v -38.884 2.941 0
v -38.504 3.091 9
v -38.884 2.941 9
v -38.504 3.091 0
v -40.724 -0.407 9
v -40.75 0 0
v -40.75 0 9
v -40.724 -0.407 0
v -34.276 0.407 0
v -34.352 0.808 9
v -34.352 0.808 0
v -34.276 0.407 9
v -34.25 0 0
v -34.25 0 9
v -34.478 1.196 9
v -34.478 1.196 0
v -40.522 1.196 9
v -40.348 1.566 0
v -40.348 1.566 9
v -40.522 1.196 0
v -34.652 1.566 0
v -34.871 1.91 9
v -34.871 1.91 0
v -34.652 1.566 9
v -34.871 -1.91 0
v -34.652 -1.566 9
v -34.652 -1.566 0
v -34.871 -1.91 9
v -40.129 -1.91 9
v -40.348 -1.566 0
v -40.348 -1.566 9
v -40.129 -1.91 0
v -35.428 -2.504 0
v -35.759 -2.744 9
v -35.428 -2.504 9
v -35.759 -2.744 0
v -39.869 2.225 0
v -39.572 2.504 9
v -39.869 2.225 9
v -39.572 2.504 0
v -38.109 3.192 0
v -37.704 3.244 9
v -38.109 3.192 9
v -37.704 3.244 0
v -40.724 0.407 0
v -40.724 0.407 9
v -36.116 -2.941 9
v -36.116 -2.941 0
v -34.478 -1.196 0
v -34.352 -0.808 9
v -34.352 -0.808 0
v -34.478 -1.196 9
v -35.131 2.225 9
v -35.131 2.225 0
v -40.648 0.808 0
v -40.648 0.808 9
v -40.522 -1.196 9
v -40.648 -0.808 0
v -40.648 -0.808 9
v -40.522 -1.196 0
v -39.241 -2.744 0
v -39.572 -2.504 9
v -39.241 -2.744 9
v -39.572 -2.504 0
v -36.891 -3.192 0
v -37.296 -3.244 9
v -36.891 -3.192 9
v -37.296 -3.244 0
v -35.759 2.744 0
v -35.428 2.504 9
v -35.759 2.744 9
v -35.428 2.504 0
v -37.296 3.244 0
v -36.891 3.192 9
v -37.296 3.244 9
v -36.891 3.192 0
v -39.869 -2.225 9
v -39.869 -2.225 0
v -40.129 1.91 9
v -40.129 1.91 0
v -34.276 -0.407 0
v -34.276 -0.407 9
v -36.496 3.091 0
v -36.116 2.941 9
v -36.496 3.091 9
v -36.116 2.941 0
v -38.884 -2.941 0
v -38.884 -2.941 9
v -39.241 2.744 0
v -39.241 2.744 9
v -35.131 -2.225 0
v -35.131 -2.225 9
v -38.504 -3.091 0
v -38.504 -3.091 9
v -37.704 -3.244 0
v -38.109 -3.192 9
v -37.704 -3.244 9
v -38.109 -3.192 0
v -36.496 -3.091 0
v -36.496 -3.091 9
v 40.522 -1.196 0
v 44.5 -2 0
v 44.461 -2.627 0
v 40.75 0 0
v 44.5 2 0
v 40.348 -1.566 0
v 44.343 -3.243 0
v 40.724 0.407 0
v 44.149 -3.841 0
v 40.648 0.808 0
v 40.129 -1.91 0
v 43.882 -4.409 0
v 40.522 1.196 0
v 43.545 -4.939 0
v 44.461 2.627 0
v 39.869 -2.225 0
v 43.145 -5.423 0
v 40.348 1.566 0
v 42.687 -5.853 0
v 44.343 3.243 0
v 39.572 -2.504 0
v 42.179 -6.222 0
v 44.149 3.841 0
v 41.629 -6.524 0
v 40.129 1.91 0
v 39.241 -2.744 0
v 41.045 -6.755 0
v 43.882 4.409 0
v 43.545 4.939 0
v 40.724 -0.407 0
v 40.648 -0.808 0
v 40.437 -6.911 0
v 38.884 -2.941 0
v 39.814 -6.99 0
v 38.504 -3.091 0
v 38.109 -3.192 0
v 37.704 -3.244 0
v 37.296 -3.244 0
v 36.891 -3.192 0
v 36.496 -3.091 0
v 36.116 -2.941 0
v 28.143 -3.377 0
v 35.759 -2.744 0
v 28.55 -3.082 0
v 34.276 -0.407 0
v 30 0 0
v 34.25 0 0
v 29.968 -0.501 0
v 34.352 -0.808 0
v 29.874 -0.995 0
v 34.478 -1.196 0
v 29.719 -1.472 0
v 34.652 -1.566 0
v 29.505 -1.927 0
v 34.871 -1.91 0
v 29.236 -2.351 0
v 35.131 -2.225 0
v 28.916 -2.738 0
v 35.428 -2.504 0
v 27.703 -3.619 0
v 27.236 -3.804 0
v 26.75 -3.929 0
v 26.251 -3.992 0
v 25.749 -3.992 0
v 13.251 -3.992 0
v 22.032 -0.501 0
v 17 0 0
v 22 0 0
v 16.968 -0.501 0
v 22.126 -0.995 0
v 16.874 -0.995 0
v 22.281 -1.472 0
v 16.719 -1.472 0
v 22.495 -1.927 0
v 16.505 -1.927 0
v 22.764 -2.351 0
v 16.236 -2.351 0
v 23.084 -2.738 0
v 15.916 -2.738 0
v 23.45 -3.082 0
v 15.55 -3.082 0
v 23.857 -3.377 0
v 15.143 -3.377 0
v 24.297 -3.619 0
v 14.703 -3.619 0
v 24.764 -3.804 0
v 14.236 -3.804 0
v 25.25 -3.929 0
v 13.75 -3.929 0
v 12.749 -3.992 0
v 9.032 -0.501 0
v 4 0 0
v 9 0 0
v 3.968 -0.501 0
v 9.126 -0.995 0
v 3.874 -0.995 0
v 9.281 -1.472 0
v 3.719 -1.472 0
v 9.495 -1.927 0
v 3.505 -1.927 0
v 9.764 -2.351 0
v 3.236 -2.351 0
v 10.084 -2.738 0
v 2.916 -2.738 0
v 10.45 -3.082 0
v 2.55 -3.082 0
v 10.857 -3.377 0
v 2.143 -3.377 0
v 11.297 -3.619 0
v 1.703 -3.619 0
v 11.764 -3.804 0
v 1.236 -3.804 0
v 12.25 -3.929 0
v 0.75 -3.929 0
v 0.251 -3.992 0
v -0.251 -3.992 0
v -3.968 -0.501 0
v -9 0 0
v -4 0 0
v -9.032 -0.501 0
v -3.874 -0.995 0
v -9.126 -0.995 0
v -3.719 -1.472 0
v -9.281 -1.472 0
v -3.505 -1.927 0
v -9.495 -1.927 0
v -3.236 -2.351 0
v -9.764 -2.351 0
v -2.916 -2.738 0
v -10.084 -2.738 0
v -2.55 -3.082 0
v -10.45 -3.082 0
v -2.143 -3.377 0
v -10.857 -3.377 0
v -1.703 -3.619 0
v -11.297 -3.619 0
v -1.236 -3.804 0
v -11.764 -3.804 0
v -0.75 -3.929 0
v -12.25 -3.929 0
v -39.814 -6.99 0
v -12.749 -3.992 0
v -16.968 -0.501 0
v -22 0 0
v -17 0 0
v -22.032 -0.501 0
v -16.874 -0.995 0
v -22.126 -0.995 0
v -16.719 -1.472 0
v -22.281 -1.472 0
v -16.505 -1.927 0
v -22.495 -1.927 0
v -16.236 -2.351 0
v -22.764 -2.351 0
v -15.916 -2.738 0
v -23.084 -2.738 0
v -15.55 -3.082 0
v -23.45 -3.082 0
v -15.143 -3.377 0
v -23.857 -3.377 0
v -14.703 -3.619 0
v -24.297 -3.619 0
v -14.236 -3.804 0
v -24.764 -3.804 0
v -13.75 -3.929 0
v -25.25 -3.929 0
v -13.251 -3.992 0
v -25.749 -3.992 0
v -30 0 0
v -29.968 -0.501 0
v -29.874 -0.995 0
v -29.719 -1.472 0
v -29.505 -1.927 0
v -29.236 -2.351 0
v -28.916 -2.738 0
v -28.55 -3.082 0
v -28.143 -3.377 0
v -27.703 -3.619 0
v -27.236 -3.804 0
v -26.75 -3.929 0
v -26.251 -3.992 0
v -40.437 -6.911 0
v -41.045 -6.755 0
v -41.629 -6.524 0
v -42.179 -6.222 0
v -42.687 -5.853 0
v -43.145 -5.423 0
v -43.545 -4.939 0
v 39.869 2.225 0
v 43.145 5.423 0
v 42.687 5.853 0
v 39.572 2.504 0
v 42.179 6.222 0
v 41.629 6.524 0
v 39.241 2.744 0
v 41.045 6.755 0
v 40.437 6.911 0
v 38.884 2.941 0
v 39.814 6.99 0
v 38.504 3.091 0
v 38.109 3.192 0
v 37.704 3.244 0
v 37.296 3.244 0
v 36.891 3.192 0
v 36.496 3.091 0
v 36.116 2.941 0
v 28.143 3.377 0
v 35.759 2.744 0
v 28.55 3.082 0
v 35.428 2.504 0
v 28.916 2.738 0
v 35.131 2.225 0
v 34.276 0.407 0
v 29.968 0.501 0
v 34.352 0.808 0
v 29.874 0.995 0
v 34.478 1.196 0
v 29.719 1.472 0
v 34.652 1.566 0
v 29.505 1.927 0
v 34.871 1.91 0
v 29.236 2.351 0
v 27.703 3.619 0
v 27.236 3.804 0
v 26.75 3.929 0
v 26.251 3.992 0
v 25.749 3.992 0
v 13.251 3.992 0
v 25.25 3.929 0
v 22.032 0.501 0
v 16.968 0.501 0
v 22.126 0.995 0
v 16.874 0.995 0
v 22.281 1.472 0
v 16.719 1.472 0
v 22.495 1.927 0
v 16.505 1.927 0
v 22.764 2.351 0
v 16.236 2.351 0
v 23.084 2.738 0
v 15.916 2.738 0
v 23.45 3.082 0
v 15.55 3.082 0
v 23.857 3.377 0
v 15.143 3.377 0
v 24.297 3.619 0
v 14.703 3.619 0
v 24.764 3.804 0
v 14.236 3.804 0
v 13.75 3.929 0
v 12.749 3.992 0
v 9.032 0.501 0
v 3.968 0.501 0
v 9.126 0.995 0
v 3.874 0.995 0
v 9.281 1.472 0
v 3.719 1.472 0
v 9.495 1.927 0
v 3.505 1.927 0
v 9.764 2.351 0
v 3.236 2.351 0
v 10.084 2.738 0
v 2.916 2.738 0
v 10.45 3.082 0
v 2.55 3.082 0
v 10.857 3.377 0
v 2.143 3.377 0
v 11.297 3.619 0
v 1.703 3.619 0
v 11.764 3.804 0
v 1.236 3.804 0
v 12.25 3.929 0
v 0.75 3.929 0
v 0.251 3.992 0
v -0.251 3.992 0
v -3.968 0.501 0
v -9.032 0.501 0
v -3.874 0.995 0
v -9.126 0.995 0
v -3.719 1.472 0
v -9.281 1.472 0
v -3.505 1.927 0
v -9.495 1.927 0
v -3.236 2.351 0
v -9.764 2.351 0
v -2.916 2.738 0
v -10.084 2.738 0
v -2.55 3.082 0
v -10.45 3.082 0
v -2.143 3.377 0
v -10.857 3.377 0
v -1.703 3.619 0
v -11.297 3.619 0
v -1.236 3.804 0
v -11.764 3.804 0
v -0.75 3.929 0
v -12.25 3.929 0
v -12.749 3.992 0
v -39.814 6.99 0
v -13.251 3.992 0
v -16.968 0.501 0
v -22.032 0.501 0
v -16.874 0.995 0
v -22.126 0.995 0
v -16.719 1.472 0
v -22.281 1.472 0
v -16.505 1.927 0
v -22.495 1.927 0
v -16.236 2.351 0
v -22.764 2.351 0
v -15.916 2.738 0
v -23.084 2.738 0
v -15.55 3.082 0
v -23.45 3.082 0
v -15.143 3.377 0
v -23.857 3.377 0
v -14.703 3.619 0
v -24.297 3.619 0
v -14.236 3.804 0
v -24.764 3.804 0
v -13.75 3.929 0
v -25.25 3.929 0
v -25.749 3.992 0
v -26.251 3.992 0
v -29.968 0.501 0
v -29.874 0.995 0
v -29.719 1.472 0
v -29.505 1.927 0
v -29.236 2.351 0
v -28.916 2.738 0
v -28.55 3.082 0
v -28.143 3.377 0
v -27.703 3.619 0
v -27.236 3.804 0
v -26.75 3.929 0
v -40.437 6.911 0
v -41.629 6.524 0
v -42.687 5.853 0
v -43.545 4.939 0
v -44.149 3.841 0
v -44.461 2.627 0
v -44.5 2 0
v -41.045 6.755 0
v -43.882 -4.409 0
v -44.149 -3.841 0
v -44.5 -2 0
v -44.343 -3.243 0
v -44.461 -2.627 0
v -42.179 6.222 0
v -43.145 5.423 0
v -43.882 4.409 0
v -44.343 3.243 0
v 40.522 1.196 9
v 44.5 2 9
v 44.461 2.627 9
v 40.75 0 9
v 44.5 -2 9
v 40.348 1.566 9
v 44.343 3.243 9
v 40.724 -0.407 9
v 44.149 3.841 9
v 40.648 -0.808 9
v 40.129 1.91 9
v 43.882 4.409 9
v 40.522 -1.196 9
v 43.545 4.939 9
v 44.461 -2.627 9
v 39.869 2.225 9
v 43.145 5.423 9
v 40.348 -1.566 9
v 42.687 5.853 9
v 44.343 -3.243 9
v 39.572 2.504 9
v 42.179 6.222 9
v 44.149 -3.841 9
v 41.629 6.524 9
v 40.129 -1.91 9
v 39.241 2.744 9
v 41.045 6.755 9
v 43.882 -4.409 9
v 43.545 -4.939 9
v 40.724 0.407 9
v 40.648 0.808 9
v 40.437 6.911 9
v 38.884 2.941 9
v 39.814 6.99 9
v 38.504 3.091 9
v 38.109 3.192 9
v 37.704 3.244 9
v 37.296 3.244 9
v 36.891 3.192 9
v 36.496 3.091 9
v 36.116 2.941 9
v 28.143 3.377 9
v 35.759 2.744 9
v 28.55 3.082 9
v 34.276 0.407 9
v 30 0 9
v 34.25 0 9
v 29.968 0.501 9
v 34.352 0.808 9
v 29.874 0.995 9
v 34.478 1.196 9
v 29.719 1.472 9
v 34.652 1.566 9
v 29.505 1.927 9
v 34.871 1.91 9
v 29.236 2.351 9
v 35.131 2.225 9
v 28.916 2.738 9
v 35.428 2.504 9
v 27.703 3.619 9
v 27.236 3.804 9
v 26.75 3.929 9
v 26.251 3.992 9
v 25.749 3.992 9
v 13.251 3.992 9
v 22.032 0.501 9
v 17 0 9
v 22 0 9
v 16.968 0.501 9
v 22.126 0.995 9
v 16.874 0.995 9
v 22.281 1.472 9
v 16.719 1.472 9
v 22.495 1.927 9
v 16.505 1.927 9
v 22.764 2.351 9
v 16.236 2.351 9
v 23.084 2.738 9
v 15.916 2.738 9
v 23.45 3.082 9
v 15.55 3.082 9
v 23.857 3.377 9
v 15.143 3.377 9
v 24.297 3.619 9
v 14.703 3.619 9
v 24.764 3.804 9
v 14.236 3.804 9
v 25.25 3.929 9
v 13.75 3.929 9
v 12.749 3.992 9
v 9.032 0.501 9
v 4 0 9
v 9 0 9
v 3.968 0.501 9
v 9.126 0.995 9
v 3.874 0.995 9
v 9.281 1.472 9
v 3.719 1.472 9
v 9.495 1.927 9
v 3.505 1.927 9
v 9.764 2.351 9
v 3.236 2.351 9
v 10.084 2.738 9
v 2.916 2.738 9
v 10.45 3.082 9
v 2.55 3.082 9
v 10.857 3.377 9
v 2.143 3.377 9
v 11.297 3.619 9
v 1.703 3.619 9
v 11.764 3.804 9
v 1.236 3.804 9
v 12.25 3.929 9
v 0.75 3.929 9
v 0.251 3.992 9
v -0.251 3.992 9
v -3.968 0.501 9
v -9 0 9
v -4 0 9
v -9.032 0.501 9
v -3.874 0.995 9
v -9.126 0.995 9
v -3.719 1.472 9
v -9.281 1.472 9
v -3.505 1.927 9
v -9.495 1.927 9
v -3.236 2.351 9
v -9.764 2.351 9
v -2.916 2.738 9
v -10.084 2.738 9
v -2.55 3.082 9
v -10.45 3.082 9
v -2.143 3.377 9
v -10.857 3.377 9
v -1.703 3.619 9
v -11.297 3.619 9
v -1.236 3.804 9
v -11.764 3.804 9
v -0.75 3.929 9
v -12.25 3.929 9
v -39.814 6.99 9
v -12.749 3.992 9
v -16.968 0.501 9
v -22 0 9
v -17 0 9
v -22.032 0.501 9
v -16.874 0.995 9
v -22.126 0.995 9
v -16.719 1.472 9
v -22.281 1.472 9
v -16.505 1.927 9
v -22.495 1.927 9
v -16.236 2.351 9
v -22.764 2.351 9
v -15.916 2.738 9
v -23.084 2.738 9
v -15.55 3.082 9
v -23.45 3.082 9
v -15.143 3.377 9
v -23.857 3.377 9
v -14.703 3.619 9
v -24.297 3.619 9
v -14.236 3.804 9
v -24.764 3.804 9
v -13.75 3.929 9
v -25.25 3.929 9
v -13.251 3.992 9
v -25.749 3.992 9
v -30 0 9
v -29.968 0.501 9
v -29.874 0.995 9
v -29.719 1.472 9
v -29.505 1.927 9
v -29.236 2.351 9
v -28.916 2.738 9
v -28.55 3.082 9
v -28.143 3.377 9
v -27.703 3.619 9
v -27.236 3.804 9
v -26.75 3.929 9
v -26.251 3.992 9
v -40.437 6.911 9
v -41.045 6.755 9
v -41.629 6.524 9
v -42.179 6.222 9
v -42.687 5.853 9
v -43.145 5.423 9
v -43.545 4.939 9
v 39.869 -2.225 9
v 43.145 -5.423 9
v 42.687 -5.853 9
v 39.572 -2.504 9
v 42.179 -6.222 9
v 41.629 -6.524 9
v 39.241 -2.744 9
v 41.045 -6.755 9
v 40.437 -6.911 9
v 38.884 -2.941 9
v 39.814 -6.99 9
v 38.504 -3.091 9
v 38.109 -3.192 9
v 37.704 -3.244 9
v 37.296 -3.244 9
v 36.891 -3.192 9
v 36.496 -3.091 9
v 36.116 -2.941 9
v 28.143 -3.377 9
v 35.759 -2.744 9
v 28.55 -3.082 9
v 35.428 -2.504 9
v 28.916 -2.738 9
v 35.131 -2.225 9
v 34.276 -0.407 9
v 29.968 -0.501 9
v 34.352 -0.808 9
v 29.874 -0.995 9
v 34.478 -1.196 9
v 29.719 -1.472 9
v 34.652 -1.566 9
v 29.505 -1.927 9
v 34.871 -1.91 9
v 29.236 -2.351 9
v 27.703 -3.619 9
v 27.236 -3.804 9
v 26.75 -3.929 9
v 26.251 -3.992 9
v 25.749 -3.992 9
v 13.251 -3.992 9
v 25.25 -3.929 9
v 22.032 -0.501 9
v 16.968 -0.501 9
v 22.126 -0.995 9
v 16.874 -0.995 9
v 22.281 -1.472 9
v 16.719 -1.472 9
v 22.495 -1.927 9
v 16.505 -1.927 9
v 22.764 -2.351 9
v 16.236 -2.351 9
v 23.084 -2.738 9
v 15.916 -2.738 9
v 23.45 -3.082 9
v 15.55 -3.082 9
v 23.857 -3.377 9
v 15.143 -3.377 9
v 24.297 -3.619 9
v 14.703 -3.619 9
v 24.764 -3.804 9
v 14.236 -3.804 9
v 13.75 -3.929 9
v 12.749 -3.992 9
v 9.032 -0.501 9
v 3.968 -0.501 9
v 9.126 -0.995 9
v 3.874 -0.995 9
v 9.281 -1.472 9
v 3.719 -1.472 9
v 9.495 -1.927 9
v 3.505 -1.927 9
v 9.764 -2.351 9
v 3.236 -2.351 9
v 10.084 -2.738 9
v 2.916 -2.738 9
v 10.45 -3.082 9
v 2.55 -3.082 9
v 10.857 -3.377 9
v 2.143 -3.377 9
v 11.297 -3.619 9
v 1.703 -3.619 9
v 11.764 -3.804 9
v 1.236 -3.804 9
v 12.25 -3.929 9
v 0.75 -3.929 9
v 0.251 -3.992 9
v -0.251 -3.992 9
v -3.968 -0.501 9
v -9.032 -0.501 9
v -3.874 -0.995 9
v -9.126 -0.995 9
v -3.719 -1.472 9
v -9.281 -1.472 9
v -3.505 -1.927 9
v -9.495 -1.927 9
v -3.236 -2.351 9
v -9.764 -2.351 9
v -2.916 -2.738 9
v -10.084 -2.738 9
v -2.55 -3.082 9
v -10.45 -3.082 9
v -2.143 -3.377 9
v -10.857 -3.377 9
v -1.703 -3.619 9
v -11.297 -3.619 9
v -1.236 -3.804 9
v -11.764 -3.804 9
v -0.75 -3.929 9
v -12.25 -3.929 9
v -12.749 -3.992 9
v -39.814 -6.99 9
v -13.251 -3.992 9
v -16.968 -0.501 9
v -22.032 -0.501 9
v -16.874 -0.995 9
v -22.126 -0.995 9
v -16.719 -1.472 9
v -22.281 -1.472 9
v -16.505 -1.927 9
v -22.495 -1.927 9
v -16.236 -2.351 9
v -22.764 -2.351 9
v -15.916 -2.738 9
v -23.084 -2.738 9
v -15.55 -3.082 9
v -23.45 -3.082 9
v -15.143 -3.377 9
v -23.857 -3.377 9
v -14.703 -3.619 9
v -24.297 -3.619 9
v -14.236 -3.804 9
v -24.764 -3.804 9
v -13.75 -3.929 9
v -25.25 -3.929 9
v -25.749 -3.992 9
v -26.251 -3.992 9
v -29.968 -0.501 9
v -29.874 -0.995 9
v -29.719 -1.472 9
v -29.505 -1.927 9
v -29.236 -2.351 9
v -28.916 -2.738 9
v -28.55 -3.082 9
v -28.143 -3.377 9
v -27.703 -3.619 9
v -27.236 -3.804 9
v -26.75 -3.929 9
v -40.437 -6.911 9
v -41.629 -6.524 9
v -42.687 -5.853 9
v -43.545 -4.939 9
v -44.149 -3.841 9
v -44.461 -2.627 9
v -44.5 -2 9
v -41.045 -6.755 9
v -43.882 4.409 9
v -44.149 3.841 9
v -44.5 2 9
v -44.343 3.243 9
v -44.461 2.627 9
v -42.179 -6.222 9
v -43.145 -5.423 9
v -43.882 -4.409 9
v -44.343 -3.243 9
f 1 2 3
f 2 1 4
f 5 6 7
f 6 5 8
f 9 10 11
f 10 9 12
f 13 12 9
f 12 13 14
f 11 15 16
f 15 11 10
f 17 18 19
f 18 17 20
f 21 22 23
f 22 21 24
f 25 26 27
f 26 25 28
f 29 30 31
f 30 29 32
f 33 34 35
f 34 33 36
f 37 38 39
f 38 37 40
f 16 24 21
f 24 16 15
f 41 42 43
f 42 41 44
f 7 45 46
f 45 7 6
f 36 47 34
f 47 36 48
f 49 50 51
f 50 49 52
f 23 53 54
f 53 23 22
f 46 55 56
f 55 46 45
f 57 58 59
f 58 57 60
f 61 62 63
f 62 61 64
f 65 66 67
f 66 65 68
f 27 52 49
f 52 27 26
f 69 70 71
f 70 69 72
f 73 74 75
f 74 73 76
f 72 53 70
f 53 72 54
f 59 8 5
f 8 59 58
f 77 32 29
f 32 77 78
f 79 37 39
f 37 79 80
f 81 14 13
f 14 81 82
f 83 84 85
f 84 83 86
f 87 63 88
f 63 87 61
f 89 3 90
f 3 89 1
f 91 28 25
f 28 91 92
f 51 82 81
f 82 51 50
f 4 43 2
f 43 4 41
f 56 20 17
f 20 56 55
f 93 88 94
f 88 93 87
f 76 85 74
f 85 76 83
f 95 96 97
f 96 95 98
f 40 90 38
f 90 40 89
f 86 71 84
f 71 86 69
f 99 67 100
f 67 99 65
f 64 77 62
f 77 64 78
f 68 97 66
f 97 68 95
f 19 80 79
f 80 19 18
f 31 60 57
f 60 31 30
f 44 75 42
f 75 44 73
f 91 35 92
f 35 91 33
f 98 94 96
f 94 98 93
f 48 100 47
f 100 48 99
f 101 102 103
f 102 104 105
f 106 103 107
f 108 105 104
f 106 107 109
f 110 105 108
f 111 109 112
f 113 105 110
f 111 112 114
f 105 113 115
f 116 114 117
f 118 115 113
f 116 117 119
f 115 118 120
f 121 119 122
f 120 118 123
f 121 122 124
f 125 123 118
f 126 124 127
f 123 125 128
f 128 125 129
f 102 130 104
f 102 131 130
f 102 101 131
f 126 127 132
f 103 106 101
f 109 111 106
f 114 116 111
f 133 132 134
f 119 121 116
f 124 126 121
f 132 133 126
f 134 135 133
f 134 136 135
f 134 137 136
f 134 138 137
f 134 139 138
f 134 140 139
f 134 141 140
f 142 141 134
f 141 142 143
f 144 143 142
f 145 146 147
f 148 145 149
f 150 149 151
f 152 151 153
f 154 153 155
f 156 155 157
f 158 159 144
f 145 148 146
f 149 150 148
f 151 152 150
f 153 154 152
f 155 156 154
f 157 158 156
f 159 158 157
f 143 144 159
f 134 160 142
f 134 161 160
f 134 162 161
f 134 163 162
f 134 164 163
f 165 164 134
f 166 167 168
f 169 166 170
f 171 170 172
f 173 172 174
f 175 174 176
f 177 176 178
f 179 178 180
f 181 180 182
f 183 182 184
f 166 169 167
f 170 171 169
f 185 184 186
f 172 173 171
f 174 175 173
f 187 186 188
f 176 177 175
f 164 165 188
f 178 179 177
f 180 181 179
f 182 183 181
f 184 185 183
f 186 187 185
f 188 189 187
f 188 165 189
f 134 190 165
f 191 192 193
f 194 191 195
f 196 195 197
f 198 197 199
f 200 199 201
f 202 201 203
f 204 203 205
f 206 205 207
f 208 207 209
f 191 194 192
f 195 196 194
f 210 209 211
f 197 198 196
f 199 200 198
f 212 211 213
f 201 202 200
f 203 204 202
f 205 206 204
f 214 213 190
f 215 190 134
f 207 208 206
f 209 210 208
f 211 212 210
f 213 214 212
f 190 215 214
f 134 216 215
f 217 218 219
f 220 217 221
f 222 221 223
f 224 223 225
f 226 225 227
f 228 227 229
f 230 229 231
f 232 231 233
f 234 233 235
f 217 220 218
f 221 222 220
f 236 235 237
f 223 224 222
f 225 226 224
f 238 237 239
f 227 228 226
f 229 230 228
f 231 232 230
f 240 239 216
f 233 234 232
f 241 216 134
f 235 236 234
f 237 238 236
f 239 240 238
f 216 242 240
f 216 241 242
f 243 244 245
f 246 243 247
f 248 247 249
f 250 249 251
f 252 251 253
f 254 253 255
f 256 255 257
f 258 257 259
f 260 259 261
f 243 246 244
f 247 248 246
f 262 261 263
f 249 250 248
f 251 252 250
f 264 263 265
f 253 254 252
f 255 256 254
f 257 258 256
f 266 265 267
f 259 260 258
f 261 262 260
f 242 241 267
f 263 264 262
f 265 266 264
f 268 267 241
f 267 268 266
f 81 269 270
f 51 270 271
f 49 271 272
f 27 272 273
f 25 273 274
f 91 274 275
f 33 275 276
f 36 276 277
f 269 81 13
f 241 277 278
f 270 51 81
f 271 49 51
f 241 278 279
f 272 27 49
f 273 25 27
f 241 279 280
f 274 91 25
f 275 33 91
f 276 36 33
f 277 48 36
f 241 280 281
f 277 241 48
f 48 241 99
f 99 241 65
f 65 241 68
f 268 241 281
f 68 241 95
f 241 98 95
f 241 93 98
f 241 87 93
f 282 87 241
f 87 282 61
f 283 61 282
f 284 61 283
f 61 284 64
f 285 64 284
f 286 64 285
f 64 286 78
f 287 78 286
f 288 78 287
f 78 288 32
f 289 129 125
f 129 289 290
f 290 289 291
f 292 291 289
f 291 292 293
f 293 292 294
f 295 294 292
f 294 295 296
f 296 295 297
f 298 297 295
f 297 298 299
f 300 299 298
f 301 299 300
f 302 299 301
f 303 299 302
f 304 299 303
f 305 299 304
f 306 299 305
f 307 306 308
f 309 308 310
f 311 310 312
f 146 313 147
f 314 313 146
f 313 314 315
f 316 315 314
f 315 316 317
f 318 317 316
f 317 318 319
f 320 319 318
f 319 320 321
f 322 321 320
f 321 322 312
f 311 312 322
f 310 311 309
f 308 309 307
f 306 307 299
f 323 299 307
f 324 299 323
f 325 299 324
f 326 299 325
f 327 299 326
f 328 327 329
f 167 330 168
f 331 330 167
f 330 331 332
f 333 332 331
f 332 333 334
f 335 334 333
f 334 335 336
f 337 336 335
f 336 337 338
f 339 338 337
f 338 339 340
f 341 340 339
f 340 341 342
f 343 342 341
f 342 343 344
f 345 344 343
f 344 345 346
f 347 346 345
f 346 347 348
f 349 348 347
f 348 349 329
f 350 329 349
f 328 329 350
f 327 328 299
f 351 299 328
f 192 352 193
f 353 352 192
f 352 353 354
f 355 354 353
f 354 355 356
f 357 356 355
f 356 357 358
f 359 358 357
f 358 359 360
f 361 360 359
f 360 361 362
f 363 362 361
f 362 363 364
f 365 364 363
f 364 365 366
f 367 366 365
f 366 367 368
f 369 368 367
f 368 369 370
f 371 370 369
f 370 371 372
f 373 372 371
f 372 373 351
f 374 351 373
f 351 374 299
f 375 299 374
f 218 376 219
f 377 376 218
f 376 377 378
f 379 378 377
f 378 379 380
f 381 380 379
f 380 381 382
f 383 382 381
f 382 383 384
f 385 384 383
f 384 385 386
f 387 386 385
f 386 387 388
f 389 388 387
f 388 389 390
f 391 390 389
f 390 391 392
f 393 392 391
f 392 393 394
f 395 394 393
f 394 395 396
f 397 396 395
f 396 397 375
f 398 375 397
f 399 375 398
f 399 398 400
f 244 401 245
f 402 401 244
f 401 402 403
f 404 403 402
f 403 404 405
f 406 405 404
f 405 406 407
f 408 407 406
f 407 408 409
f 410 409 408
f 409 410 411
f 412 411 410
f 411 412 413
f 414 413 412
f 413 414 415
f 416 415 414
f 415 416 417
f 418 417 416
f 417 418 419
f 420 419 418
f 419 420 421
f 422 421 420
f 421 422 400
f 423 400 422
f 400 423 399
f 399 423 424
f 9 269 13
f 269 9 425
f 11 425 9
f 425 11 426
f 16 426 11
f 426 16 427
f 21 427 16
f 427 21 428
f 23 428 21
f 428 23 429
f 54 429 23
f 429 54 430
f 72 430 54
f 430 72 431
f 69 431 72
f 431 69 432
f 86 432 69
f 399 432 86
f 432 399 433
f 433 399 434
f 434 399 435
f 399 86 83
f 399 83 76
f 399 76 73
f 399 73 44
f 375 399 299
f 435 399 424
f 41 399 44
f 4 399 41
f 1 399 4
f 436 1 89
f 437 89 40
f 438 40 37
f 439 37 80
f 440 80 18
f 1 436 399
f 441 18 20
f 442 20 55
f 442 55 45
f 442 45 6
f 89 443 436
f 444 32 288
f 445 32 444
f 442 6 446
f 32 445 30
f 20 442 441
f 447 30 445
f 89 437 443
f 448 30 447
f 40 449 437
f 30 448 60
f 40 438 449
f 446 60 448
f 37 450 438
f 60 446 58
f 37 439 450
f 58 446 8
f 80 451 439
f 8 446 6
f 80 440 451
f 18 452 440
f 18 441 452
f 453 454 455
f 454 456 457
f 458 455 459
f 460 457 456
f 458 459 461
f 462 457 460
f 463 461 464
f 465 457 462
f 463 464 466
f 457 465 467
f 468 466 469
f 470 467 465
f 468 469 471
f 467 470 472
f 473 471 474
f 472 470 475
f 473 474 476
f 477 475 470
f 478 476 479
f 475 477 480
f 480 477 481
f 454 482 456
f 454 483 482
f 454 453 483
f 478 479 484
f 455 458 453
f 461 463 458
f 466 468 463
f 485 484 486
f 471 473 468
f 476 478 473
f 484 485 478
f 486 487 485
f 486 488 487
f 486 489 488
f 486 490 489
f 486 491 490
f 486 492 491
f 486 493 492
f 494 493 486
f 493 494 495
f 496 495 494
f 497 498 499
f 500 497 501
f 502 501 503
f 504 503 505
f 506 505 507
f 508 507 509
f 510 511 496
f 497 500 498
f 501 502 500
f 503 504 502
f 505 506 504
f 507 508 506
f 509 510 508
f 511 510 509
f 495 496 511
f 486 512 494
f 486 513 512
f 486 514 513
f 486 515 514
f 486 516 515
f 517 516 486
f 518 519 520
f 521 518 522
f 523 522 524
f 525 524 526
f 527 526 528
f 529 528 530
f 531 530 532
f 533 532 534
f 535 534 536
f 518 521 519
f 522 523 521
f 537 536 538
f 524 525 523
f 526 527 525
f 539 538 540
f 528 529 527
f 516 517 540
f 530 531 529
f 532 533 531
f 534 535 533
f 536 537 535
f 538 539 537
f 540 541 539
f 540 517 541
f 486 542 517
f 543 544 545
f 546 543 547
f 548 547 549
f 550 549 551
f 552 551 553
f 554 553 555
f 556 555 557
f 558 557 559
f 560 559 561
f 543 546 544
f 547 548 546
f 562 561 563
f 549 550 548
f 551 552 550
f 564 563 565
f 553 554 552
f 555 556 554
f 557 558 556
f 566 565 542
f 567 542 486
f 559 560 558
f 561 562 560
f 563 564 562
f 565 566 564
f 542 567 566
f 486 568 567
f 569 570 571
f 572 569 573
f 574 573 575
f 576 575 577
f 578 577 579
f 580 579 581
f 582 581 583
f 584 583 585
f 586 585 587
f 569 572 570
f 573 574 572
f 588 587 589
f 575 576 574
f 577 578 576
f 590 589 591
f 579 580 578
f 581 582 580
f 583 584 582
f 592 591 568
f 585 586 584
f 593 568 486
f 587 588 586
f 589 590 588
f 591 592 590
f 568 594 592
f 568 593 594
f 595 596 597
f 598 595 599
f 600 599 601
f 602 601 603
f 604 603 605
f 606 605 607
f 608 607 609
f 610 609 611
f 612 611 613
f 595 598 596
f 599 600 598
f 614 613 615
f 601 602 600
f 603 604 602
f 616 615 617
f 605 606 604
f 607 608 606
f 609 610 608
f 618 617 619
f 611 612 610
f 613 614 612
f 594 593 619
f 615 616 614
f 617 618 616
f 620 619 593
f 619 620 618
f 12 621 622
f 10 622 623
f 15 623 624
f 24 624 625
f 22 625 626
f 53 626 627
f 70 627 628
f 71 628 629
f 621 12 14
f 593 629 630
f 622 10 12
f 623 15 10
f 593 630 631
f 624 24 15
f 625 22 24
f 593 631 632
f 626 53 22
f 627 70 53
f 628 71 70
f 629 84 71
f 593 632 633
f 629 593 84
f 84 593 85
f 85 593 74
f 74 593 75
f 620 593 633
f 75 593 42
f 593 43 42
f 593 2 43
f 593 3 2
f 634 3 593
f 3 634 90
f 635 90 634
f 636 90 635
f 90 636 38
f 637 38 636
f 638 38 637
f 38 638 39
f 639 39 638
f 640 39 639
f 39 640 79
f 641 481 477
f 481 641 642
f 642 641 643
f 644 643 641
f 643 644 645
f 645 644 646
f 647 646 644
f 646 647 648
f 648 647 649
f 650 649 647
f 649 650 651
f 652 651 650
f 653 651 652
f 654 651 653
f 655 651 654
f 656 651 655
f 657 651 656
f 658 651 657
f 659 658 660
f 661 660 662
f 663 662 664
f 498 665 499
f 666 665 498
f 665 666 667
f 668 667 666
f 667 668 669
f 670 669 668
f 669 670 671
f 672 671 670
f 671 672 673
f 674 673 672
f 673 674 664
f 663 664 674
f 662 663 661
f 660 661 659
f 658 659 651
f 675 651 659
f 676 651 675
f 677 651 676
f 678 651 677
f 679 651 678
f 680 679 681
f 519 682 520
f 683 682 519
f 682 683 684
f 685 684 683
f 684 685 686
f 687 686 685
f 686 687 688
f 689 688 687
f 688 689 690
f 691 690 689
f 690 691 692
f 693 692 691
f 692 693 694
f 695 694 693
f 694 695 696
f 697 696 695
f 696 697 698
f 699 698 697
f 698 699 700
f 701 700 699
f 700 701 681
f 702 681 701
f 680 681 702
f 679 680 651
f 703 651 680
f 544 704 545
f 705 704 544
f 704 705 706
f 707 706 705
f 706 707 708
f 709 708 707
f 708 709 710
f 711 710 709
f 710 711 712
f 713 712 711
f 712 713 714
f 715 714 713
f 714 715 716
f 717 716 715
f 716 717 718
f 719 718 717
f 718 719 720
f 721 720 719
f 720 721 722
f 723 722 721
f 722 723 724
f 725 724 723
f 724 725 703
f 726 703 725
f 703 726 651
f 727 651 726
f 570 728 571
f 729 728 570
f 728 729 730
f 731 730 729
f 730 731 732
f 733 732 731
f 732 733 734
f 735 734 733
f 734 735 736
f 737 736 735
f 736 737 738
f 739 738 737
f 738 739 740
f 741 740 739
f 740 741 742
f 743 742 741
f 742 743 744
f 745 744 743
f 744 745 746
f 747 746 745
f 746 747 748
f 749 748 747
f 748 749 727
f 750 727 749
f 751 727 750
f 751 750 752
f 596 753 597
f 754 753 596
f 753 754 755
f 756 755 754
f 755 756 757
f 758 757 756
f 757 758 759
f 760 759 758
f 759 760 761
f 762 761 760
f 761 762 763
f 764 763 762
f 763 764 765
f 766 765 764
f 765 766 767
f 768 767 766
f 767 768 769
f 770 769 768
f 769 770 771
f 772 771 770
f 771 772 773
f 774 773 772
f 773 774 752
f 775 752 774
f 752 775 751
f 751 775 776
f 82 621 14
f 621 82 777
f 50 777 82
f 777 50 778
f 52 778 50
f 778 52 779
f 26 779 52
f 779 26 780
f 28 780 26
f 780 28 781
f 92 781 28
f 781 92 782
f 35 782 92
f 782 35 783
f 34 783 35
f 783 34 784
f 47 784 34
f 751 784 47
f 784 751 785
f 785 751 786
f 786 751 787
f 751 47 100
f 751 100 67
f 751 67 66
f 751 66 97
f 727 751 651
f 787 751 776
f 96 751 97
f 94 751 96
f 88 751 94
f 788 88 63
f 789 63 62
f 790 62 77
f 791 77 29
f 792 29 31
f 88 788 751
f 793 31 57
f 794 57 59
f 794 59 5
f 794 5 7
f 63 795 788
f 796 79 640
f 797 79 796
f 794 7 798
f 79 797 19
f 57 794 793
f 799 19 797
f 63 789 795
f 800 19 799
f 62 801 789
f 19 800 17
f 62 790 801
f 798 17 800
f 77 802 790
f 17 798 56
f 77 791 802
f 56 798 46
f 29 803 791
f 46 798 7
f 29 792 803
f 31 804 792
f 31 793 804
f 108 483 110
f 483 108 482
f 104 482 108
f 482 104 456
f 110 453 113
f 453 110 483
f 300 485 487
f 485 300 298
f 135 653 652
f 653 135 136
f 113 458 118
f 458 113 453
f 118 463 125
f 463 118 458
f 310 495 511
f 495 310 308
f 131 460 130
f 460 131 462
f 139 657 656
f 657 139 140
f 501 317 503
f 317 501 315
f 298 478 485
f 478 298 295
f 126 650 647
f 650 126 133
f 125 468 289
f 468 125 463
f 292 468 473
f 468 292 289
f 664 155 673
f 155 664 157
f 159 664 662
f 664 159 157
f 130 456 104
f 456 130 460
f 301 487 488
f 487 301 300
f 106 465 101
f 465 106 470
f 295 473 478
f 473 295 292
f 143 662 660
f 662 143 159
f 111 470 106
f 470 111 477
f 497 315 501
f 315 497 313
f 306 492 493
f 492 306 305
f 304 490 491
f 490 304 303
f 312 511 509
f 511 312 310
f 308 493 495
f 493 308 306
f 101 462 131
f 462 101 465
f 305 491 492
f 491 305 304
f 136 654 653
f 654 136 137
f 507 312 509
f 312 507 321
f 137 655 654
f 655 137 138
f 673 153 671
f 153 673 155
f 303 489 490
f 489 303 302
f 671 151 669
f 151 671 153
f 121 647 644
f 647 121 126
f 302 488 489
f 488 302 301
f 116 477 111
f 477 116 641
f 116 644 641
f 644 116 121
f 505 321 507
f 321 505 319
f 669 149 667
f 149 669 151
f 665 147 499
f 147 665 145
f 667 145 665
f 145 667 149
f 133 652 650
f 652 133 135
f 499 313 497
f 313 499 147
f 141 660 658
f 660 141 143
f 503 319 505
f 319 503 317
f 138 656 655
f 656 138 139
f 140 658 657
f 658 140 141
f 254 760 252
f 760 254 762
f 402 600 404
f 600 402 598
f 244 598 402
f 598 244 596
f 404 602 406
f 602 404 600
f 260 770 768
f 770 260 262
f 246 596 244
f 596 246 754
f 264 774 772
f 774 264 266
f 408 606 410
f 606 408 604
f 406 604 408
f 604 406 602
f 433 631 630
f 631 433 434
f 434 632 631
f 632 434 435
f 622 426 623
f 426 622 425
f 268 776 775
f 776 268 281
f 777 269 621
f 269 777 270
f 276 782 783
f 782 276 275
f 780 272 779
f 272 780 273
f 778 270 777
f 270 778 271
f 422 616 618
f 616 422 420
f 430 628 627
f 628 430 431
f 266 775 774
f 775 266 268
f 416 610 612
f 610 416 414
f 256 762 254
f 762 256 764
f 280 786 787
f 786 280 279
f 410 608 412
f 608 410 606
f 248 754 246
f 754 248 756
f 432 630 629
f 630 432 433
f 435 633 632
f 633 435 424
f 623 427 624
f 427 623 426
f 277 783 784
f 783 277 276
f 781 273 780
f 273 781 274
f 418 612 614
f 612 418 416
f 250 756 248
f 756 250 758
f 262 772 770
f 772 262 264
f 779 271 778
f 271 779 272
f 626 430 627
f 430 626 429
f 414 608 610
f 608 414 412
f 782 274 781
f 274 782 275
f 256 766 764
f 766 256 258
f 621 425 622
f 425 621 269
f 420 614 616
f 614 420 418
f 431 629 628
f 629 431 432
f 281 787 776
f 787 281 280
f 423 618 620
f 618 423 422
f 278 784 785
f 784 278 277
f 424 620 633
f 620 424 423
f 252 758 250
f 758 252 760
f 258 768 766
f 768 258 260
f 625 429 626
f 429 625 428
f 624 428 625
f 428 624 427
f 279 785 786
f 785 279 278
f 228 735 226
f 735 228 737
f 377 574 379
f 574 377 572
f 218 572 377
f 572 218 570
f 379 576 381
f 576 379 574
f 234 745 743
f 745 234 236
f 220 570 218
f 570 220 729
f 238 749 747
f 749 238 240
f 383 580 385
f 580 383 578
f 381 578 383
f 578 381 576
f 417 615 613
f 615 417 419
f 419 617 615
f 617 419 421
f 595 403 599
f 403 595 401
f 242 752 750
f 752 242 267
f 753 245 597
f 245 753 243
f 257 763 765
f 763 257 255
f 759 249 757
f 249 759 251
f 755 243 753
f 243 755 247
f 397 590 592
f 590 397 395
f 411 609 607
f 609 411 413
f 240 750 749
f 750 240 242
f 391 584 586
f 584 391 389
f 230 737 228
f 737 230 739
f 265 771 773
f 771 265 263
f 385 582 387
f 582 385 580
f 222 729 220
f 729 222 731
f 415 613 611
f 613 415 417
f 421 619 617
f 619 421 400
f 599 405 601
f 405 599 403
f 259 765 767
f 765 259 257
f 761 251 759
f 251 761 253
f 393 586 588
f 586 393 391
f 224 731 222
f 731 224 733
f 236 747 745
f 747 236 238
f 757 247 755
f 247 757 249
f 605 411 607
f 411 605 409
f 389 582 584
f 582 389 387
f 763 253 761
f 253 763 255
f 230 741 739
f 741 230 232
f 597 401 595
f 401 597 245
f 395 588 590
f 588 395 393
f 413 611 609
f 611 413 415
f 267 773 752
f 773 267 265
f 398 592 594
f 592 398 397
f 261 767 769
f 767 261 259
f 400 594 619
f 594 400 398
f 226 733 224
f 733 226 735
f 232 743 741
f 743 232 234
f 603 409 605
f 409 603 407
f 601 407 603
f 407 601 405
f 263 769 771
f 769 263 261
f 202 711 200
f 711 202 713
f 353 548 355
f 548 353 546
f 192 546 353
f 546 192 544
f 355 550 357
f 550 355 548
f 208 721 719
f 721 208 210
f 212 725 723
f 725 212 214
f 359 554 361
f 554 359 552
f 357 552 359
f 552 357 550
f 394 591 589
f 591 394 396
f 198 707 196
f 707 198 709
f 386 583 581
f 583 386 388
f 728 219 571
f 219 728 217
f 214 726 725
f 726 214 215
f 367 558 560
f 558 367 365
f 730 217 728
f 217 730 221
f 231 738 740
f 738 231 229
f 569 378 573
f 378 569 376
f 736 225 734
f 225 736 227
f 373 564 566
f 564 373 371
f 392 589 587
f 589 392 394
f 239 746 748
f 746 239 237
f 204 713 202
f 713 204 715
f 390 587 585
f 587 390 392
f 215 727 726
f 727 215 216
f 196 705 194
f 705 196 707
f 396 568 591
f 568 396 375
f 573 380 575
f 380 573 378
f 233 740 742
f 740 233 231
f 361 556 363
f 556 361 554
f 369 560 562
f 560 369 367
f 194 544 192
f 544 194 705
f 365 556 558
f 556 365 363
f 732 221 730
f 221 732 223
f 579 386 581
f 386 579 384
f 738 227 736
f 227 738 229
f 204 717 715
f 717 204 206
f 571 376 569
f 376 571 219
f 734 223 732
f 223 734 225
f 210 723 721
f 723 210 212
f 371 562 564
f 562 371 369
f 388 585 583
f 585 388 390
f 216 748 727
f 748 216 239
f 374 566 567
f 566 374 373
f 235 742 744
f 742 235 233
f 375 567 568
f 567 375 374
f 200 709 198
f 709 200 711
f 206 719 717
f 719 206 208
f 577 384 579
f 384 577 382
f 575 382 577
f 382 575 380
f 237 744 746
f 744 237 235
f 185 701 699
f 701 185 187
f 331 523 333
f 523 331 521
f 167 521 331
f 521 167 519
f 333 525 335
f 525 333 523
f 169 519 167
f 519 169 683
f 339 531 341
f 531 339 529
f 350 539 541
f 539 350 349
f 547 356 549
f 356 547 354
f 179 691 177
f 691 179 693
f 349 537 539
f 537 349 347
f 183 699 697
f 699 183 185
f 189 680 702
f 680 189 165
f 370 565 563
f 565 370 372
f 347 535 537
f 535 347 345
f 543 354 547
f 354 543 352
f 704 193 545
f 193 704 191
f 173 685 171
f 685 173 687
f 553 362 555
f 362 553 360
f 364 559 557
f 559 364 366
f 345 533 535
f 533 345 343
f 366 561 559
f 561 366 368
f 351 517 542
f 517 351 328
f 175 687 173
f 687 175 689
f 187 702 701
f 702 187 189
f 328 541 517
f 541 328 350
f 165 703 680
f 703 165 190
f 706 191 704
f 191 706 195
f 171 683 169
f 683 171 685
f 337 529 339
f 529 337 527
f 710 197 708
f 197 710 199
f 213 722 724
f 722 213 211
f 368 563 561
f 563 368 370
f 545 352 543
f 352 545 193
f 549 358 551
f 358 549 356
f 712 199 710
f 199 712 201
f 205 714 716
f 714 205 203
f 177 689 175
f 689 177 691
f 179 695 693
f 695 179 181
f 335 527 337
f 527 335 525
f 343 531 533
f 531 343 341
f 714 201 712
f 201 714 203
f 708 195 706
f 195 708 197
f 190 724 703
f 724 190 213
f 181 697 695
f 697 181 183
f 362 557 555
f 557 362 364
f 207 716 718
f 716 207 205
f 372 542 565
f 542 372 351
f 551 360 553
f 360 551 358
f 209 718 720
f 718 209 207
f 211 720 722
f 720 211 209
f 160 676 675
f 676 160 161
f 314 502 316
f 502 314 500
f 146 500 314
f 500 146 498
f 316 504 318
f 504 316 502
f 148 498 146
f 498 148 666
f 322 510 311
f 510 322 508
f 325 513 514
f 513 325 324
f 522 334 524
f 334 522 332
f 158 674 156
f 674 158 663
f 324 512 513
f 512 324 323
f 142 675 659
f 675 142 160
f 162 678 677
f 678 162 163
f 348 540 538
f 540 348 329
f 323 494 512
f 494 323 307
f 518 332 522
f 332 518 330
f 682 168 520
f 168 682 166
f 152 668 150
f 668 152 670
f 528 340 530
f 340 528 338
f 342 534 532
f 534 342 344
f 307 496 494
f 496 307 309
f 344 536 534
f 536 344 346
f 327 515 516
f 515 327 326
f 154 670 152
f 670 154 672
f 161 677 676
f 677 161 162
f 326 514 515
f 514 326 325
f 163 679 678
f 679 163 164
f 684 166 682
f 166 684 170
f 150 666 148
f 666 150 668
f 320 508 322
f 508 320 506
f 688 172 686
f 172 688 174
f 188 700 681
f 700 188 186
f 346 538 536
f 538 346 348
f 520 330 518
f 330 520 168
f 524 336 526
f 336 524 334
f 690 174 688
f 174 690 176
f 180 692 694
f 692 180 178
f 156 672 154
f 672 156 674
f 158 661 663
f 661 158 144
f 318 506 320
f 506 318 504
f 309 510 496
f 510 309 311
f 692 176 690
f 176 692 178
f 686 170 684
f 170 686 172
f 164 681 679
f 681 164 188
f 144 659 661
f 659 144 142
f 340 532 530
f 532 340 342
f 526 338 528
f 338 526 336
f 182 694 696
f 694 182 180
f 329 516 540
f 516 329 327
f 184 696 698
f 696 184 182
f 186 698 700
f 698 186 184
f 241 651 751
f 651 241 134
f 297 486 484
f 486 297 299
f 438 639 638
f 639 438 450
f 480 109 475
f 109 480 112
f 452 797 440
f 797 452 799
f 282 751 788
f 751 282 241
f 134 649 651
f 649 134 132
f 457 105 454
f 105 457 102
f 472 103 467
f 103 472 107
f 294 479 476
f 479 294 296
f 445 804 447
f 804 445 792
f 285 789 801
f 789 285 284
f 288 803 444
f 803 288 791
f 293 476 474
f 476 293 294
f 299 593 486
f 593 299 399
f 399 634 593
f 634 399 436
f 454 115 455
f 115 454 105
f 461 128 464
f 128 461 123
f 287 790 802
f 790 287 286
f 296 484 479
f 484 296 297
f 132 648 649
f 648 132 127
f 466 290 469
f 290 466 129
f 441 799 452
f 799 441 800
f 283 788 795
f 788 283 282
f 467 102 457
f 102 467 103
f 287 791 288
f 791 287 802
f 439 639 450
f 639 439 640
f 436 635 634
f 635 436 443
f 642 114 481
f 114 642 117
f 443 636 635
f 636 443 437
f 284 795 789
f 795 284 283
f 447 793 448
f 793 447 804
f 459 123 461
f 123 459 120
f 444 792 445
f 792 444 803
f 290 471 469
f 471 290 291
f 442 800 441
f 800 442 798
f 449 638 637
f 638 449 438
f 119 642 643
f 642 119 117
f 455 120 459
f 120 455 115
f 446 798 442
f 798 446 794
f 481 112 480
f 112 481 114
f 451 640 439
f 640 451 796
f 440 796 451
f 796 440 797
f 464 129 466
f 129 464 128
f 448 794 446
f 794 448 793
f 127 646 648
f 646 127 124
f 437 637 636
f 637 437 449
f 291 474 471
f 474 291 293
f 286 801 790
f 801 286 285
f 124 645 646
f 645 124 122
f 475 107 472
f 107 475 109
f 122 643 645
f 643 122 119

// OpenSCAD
$fn = 50;

difference() {
	union() {
		hull() {
			translate(v = [-39.5, 2.0, 0]) {
				cylinder(h = 9, r = 5);
			}
			translate(v = [39.5, 2.0, 0]) {
				cylinder(h = 9, r = 5);
			}
			translate(v = [-39.5, -2.0, 0]) {
				cylinder(h = 9, r = 5);
			}
			translate(v = [39.5, -2.0, 0]) {
				cylinder(h = 9, r = 5);
			}
		}
	}
	union() {
		translate(v = [-37.5, 0.0, 0]) {
			cylinder(h = 9, r = 3.25);
		}
		translate(v = [37.5, 0.0, 0]) {
			cylinder(h = 9, r = 3.25);
		}
		translate(v = [-26.0, 0, 0.0]) {
			cylinder(h = 9, r = 4.0);
		}
		translate(v = [-13.0, 0, 0.0]) {
			cylinder(h = 9, r = 4.0);
		}
		cylinder(h = 9, r = 4.0);
		translate(v = [13.0, 0, 0.0]) {
			cylinder(h = 9, r = 4.0);
		}
		translate(v = [26.0, 0, 0.0]) {
			cylinder(h = 9, r = 4.0);
		}
	}
}
